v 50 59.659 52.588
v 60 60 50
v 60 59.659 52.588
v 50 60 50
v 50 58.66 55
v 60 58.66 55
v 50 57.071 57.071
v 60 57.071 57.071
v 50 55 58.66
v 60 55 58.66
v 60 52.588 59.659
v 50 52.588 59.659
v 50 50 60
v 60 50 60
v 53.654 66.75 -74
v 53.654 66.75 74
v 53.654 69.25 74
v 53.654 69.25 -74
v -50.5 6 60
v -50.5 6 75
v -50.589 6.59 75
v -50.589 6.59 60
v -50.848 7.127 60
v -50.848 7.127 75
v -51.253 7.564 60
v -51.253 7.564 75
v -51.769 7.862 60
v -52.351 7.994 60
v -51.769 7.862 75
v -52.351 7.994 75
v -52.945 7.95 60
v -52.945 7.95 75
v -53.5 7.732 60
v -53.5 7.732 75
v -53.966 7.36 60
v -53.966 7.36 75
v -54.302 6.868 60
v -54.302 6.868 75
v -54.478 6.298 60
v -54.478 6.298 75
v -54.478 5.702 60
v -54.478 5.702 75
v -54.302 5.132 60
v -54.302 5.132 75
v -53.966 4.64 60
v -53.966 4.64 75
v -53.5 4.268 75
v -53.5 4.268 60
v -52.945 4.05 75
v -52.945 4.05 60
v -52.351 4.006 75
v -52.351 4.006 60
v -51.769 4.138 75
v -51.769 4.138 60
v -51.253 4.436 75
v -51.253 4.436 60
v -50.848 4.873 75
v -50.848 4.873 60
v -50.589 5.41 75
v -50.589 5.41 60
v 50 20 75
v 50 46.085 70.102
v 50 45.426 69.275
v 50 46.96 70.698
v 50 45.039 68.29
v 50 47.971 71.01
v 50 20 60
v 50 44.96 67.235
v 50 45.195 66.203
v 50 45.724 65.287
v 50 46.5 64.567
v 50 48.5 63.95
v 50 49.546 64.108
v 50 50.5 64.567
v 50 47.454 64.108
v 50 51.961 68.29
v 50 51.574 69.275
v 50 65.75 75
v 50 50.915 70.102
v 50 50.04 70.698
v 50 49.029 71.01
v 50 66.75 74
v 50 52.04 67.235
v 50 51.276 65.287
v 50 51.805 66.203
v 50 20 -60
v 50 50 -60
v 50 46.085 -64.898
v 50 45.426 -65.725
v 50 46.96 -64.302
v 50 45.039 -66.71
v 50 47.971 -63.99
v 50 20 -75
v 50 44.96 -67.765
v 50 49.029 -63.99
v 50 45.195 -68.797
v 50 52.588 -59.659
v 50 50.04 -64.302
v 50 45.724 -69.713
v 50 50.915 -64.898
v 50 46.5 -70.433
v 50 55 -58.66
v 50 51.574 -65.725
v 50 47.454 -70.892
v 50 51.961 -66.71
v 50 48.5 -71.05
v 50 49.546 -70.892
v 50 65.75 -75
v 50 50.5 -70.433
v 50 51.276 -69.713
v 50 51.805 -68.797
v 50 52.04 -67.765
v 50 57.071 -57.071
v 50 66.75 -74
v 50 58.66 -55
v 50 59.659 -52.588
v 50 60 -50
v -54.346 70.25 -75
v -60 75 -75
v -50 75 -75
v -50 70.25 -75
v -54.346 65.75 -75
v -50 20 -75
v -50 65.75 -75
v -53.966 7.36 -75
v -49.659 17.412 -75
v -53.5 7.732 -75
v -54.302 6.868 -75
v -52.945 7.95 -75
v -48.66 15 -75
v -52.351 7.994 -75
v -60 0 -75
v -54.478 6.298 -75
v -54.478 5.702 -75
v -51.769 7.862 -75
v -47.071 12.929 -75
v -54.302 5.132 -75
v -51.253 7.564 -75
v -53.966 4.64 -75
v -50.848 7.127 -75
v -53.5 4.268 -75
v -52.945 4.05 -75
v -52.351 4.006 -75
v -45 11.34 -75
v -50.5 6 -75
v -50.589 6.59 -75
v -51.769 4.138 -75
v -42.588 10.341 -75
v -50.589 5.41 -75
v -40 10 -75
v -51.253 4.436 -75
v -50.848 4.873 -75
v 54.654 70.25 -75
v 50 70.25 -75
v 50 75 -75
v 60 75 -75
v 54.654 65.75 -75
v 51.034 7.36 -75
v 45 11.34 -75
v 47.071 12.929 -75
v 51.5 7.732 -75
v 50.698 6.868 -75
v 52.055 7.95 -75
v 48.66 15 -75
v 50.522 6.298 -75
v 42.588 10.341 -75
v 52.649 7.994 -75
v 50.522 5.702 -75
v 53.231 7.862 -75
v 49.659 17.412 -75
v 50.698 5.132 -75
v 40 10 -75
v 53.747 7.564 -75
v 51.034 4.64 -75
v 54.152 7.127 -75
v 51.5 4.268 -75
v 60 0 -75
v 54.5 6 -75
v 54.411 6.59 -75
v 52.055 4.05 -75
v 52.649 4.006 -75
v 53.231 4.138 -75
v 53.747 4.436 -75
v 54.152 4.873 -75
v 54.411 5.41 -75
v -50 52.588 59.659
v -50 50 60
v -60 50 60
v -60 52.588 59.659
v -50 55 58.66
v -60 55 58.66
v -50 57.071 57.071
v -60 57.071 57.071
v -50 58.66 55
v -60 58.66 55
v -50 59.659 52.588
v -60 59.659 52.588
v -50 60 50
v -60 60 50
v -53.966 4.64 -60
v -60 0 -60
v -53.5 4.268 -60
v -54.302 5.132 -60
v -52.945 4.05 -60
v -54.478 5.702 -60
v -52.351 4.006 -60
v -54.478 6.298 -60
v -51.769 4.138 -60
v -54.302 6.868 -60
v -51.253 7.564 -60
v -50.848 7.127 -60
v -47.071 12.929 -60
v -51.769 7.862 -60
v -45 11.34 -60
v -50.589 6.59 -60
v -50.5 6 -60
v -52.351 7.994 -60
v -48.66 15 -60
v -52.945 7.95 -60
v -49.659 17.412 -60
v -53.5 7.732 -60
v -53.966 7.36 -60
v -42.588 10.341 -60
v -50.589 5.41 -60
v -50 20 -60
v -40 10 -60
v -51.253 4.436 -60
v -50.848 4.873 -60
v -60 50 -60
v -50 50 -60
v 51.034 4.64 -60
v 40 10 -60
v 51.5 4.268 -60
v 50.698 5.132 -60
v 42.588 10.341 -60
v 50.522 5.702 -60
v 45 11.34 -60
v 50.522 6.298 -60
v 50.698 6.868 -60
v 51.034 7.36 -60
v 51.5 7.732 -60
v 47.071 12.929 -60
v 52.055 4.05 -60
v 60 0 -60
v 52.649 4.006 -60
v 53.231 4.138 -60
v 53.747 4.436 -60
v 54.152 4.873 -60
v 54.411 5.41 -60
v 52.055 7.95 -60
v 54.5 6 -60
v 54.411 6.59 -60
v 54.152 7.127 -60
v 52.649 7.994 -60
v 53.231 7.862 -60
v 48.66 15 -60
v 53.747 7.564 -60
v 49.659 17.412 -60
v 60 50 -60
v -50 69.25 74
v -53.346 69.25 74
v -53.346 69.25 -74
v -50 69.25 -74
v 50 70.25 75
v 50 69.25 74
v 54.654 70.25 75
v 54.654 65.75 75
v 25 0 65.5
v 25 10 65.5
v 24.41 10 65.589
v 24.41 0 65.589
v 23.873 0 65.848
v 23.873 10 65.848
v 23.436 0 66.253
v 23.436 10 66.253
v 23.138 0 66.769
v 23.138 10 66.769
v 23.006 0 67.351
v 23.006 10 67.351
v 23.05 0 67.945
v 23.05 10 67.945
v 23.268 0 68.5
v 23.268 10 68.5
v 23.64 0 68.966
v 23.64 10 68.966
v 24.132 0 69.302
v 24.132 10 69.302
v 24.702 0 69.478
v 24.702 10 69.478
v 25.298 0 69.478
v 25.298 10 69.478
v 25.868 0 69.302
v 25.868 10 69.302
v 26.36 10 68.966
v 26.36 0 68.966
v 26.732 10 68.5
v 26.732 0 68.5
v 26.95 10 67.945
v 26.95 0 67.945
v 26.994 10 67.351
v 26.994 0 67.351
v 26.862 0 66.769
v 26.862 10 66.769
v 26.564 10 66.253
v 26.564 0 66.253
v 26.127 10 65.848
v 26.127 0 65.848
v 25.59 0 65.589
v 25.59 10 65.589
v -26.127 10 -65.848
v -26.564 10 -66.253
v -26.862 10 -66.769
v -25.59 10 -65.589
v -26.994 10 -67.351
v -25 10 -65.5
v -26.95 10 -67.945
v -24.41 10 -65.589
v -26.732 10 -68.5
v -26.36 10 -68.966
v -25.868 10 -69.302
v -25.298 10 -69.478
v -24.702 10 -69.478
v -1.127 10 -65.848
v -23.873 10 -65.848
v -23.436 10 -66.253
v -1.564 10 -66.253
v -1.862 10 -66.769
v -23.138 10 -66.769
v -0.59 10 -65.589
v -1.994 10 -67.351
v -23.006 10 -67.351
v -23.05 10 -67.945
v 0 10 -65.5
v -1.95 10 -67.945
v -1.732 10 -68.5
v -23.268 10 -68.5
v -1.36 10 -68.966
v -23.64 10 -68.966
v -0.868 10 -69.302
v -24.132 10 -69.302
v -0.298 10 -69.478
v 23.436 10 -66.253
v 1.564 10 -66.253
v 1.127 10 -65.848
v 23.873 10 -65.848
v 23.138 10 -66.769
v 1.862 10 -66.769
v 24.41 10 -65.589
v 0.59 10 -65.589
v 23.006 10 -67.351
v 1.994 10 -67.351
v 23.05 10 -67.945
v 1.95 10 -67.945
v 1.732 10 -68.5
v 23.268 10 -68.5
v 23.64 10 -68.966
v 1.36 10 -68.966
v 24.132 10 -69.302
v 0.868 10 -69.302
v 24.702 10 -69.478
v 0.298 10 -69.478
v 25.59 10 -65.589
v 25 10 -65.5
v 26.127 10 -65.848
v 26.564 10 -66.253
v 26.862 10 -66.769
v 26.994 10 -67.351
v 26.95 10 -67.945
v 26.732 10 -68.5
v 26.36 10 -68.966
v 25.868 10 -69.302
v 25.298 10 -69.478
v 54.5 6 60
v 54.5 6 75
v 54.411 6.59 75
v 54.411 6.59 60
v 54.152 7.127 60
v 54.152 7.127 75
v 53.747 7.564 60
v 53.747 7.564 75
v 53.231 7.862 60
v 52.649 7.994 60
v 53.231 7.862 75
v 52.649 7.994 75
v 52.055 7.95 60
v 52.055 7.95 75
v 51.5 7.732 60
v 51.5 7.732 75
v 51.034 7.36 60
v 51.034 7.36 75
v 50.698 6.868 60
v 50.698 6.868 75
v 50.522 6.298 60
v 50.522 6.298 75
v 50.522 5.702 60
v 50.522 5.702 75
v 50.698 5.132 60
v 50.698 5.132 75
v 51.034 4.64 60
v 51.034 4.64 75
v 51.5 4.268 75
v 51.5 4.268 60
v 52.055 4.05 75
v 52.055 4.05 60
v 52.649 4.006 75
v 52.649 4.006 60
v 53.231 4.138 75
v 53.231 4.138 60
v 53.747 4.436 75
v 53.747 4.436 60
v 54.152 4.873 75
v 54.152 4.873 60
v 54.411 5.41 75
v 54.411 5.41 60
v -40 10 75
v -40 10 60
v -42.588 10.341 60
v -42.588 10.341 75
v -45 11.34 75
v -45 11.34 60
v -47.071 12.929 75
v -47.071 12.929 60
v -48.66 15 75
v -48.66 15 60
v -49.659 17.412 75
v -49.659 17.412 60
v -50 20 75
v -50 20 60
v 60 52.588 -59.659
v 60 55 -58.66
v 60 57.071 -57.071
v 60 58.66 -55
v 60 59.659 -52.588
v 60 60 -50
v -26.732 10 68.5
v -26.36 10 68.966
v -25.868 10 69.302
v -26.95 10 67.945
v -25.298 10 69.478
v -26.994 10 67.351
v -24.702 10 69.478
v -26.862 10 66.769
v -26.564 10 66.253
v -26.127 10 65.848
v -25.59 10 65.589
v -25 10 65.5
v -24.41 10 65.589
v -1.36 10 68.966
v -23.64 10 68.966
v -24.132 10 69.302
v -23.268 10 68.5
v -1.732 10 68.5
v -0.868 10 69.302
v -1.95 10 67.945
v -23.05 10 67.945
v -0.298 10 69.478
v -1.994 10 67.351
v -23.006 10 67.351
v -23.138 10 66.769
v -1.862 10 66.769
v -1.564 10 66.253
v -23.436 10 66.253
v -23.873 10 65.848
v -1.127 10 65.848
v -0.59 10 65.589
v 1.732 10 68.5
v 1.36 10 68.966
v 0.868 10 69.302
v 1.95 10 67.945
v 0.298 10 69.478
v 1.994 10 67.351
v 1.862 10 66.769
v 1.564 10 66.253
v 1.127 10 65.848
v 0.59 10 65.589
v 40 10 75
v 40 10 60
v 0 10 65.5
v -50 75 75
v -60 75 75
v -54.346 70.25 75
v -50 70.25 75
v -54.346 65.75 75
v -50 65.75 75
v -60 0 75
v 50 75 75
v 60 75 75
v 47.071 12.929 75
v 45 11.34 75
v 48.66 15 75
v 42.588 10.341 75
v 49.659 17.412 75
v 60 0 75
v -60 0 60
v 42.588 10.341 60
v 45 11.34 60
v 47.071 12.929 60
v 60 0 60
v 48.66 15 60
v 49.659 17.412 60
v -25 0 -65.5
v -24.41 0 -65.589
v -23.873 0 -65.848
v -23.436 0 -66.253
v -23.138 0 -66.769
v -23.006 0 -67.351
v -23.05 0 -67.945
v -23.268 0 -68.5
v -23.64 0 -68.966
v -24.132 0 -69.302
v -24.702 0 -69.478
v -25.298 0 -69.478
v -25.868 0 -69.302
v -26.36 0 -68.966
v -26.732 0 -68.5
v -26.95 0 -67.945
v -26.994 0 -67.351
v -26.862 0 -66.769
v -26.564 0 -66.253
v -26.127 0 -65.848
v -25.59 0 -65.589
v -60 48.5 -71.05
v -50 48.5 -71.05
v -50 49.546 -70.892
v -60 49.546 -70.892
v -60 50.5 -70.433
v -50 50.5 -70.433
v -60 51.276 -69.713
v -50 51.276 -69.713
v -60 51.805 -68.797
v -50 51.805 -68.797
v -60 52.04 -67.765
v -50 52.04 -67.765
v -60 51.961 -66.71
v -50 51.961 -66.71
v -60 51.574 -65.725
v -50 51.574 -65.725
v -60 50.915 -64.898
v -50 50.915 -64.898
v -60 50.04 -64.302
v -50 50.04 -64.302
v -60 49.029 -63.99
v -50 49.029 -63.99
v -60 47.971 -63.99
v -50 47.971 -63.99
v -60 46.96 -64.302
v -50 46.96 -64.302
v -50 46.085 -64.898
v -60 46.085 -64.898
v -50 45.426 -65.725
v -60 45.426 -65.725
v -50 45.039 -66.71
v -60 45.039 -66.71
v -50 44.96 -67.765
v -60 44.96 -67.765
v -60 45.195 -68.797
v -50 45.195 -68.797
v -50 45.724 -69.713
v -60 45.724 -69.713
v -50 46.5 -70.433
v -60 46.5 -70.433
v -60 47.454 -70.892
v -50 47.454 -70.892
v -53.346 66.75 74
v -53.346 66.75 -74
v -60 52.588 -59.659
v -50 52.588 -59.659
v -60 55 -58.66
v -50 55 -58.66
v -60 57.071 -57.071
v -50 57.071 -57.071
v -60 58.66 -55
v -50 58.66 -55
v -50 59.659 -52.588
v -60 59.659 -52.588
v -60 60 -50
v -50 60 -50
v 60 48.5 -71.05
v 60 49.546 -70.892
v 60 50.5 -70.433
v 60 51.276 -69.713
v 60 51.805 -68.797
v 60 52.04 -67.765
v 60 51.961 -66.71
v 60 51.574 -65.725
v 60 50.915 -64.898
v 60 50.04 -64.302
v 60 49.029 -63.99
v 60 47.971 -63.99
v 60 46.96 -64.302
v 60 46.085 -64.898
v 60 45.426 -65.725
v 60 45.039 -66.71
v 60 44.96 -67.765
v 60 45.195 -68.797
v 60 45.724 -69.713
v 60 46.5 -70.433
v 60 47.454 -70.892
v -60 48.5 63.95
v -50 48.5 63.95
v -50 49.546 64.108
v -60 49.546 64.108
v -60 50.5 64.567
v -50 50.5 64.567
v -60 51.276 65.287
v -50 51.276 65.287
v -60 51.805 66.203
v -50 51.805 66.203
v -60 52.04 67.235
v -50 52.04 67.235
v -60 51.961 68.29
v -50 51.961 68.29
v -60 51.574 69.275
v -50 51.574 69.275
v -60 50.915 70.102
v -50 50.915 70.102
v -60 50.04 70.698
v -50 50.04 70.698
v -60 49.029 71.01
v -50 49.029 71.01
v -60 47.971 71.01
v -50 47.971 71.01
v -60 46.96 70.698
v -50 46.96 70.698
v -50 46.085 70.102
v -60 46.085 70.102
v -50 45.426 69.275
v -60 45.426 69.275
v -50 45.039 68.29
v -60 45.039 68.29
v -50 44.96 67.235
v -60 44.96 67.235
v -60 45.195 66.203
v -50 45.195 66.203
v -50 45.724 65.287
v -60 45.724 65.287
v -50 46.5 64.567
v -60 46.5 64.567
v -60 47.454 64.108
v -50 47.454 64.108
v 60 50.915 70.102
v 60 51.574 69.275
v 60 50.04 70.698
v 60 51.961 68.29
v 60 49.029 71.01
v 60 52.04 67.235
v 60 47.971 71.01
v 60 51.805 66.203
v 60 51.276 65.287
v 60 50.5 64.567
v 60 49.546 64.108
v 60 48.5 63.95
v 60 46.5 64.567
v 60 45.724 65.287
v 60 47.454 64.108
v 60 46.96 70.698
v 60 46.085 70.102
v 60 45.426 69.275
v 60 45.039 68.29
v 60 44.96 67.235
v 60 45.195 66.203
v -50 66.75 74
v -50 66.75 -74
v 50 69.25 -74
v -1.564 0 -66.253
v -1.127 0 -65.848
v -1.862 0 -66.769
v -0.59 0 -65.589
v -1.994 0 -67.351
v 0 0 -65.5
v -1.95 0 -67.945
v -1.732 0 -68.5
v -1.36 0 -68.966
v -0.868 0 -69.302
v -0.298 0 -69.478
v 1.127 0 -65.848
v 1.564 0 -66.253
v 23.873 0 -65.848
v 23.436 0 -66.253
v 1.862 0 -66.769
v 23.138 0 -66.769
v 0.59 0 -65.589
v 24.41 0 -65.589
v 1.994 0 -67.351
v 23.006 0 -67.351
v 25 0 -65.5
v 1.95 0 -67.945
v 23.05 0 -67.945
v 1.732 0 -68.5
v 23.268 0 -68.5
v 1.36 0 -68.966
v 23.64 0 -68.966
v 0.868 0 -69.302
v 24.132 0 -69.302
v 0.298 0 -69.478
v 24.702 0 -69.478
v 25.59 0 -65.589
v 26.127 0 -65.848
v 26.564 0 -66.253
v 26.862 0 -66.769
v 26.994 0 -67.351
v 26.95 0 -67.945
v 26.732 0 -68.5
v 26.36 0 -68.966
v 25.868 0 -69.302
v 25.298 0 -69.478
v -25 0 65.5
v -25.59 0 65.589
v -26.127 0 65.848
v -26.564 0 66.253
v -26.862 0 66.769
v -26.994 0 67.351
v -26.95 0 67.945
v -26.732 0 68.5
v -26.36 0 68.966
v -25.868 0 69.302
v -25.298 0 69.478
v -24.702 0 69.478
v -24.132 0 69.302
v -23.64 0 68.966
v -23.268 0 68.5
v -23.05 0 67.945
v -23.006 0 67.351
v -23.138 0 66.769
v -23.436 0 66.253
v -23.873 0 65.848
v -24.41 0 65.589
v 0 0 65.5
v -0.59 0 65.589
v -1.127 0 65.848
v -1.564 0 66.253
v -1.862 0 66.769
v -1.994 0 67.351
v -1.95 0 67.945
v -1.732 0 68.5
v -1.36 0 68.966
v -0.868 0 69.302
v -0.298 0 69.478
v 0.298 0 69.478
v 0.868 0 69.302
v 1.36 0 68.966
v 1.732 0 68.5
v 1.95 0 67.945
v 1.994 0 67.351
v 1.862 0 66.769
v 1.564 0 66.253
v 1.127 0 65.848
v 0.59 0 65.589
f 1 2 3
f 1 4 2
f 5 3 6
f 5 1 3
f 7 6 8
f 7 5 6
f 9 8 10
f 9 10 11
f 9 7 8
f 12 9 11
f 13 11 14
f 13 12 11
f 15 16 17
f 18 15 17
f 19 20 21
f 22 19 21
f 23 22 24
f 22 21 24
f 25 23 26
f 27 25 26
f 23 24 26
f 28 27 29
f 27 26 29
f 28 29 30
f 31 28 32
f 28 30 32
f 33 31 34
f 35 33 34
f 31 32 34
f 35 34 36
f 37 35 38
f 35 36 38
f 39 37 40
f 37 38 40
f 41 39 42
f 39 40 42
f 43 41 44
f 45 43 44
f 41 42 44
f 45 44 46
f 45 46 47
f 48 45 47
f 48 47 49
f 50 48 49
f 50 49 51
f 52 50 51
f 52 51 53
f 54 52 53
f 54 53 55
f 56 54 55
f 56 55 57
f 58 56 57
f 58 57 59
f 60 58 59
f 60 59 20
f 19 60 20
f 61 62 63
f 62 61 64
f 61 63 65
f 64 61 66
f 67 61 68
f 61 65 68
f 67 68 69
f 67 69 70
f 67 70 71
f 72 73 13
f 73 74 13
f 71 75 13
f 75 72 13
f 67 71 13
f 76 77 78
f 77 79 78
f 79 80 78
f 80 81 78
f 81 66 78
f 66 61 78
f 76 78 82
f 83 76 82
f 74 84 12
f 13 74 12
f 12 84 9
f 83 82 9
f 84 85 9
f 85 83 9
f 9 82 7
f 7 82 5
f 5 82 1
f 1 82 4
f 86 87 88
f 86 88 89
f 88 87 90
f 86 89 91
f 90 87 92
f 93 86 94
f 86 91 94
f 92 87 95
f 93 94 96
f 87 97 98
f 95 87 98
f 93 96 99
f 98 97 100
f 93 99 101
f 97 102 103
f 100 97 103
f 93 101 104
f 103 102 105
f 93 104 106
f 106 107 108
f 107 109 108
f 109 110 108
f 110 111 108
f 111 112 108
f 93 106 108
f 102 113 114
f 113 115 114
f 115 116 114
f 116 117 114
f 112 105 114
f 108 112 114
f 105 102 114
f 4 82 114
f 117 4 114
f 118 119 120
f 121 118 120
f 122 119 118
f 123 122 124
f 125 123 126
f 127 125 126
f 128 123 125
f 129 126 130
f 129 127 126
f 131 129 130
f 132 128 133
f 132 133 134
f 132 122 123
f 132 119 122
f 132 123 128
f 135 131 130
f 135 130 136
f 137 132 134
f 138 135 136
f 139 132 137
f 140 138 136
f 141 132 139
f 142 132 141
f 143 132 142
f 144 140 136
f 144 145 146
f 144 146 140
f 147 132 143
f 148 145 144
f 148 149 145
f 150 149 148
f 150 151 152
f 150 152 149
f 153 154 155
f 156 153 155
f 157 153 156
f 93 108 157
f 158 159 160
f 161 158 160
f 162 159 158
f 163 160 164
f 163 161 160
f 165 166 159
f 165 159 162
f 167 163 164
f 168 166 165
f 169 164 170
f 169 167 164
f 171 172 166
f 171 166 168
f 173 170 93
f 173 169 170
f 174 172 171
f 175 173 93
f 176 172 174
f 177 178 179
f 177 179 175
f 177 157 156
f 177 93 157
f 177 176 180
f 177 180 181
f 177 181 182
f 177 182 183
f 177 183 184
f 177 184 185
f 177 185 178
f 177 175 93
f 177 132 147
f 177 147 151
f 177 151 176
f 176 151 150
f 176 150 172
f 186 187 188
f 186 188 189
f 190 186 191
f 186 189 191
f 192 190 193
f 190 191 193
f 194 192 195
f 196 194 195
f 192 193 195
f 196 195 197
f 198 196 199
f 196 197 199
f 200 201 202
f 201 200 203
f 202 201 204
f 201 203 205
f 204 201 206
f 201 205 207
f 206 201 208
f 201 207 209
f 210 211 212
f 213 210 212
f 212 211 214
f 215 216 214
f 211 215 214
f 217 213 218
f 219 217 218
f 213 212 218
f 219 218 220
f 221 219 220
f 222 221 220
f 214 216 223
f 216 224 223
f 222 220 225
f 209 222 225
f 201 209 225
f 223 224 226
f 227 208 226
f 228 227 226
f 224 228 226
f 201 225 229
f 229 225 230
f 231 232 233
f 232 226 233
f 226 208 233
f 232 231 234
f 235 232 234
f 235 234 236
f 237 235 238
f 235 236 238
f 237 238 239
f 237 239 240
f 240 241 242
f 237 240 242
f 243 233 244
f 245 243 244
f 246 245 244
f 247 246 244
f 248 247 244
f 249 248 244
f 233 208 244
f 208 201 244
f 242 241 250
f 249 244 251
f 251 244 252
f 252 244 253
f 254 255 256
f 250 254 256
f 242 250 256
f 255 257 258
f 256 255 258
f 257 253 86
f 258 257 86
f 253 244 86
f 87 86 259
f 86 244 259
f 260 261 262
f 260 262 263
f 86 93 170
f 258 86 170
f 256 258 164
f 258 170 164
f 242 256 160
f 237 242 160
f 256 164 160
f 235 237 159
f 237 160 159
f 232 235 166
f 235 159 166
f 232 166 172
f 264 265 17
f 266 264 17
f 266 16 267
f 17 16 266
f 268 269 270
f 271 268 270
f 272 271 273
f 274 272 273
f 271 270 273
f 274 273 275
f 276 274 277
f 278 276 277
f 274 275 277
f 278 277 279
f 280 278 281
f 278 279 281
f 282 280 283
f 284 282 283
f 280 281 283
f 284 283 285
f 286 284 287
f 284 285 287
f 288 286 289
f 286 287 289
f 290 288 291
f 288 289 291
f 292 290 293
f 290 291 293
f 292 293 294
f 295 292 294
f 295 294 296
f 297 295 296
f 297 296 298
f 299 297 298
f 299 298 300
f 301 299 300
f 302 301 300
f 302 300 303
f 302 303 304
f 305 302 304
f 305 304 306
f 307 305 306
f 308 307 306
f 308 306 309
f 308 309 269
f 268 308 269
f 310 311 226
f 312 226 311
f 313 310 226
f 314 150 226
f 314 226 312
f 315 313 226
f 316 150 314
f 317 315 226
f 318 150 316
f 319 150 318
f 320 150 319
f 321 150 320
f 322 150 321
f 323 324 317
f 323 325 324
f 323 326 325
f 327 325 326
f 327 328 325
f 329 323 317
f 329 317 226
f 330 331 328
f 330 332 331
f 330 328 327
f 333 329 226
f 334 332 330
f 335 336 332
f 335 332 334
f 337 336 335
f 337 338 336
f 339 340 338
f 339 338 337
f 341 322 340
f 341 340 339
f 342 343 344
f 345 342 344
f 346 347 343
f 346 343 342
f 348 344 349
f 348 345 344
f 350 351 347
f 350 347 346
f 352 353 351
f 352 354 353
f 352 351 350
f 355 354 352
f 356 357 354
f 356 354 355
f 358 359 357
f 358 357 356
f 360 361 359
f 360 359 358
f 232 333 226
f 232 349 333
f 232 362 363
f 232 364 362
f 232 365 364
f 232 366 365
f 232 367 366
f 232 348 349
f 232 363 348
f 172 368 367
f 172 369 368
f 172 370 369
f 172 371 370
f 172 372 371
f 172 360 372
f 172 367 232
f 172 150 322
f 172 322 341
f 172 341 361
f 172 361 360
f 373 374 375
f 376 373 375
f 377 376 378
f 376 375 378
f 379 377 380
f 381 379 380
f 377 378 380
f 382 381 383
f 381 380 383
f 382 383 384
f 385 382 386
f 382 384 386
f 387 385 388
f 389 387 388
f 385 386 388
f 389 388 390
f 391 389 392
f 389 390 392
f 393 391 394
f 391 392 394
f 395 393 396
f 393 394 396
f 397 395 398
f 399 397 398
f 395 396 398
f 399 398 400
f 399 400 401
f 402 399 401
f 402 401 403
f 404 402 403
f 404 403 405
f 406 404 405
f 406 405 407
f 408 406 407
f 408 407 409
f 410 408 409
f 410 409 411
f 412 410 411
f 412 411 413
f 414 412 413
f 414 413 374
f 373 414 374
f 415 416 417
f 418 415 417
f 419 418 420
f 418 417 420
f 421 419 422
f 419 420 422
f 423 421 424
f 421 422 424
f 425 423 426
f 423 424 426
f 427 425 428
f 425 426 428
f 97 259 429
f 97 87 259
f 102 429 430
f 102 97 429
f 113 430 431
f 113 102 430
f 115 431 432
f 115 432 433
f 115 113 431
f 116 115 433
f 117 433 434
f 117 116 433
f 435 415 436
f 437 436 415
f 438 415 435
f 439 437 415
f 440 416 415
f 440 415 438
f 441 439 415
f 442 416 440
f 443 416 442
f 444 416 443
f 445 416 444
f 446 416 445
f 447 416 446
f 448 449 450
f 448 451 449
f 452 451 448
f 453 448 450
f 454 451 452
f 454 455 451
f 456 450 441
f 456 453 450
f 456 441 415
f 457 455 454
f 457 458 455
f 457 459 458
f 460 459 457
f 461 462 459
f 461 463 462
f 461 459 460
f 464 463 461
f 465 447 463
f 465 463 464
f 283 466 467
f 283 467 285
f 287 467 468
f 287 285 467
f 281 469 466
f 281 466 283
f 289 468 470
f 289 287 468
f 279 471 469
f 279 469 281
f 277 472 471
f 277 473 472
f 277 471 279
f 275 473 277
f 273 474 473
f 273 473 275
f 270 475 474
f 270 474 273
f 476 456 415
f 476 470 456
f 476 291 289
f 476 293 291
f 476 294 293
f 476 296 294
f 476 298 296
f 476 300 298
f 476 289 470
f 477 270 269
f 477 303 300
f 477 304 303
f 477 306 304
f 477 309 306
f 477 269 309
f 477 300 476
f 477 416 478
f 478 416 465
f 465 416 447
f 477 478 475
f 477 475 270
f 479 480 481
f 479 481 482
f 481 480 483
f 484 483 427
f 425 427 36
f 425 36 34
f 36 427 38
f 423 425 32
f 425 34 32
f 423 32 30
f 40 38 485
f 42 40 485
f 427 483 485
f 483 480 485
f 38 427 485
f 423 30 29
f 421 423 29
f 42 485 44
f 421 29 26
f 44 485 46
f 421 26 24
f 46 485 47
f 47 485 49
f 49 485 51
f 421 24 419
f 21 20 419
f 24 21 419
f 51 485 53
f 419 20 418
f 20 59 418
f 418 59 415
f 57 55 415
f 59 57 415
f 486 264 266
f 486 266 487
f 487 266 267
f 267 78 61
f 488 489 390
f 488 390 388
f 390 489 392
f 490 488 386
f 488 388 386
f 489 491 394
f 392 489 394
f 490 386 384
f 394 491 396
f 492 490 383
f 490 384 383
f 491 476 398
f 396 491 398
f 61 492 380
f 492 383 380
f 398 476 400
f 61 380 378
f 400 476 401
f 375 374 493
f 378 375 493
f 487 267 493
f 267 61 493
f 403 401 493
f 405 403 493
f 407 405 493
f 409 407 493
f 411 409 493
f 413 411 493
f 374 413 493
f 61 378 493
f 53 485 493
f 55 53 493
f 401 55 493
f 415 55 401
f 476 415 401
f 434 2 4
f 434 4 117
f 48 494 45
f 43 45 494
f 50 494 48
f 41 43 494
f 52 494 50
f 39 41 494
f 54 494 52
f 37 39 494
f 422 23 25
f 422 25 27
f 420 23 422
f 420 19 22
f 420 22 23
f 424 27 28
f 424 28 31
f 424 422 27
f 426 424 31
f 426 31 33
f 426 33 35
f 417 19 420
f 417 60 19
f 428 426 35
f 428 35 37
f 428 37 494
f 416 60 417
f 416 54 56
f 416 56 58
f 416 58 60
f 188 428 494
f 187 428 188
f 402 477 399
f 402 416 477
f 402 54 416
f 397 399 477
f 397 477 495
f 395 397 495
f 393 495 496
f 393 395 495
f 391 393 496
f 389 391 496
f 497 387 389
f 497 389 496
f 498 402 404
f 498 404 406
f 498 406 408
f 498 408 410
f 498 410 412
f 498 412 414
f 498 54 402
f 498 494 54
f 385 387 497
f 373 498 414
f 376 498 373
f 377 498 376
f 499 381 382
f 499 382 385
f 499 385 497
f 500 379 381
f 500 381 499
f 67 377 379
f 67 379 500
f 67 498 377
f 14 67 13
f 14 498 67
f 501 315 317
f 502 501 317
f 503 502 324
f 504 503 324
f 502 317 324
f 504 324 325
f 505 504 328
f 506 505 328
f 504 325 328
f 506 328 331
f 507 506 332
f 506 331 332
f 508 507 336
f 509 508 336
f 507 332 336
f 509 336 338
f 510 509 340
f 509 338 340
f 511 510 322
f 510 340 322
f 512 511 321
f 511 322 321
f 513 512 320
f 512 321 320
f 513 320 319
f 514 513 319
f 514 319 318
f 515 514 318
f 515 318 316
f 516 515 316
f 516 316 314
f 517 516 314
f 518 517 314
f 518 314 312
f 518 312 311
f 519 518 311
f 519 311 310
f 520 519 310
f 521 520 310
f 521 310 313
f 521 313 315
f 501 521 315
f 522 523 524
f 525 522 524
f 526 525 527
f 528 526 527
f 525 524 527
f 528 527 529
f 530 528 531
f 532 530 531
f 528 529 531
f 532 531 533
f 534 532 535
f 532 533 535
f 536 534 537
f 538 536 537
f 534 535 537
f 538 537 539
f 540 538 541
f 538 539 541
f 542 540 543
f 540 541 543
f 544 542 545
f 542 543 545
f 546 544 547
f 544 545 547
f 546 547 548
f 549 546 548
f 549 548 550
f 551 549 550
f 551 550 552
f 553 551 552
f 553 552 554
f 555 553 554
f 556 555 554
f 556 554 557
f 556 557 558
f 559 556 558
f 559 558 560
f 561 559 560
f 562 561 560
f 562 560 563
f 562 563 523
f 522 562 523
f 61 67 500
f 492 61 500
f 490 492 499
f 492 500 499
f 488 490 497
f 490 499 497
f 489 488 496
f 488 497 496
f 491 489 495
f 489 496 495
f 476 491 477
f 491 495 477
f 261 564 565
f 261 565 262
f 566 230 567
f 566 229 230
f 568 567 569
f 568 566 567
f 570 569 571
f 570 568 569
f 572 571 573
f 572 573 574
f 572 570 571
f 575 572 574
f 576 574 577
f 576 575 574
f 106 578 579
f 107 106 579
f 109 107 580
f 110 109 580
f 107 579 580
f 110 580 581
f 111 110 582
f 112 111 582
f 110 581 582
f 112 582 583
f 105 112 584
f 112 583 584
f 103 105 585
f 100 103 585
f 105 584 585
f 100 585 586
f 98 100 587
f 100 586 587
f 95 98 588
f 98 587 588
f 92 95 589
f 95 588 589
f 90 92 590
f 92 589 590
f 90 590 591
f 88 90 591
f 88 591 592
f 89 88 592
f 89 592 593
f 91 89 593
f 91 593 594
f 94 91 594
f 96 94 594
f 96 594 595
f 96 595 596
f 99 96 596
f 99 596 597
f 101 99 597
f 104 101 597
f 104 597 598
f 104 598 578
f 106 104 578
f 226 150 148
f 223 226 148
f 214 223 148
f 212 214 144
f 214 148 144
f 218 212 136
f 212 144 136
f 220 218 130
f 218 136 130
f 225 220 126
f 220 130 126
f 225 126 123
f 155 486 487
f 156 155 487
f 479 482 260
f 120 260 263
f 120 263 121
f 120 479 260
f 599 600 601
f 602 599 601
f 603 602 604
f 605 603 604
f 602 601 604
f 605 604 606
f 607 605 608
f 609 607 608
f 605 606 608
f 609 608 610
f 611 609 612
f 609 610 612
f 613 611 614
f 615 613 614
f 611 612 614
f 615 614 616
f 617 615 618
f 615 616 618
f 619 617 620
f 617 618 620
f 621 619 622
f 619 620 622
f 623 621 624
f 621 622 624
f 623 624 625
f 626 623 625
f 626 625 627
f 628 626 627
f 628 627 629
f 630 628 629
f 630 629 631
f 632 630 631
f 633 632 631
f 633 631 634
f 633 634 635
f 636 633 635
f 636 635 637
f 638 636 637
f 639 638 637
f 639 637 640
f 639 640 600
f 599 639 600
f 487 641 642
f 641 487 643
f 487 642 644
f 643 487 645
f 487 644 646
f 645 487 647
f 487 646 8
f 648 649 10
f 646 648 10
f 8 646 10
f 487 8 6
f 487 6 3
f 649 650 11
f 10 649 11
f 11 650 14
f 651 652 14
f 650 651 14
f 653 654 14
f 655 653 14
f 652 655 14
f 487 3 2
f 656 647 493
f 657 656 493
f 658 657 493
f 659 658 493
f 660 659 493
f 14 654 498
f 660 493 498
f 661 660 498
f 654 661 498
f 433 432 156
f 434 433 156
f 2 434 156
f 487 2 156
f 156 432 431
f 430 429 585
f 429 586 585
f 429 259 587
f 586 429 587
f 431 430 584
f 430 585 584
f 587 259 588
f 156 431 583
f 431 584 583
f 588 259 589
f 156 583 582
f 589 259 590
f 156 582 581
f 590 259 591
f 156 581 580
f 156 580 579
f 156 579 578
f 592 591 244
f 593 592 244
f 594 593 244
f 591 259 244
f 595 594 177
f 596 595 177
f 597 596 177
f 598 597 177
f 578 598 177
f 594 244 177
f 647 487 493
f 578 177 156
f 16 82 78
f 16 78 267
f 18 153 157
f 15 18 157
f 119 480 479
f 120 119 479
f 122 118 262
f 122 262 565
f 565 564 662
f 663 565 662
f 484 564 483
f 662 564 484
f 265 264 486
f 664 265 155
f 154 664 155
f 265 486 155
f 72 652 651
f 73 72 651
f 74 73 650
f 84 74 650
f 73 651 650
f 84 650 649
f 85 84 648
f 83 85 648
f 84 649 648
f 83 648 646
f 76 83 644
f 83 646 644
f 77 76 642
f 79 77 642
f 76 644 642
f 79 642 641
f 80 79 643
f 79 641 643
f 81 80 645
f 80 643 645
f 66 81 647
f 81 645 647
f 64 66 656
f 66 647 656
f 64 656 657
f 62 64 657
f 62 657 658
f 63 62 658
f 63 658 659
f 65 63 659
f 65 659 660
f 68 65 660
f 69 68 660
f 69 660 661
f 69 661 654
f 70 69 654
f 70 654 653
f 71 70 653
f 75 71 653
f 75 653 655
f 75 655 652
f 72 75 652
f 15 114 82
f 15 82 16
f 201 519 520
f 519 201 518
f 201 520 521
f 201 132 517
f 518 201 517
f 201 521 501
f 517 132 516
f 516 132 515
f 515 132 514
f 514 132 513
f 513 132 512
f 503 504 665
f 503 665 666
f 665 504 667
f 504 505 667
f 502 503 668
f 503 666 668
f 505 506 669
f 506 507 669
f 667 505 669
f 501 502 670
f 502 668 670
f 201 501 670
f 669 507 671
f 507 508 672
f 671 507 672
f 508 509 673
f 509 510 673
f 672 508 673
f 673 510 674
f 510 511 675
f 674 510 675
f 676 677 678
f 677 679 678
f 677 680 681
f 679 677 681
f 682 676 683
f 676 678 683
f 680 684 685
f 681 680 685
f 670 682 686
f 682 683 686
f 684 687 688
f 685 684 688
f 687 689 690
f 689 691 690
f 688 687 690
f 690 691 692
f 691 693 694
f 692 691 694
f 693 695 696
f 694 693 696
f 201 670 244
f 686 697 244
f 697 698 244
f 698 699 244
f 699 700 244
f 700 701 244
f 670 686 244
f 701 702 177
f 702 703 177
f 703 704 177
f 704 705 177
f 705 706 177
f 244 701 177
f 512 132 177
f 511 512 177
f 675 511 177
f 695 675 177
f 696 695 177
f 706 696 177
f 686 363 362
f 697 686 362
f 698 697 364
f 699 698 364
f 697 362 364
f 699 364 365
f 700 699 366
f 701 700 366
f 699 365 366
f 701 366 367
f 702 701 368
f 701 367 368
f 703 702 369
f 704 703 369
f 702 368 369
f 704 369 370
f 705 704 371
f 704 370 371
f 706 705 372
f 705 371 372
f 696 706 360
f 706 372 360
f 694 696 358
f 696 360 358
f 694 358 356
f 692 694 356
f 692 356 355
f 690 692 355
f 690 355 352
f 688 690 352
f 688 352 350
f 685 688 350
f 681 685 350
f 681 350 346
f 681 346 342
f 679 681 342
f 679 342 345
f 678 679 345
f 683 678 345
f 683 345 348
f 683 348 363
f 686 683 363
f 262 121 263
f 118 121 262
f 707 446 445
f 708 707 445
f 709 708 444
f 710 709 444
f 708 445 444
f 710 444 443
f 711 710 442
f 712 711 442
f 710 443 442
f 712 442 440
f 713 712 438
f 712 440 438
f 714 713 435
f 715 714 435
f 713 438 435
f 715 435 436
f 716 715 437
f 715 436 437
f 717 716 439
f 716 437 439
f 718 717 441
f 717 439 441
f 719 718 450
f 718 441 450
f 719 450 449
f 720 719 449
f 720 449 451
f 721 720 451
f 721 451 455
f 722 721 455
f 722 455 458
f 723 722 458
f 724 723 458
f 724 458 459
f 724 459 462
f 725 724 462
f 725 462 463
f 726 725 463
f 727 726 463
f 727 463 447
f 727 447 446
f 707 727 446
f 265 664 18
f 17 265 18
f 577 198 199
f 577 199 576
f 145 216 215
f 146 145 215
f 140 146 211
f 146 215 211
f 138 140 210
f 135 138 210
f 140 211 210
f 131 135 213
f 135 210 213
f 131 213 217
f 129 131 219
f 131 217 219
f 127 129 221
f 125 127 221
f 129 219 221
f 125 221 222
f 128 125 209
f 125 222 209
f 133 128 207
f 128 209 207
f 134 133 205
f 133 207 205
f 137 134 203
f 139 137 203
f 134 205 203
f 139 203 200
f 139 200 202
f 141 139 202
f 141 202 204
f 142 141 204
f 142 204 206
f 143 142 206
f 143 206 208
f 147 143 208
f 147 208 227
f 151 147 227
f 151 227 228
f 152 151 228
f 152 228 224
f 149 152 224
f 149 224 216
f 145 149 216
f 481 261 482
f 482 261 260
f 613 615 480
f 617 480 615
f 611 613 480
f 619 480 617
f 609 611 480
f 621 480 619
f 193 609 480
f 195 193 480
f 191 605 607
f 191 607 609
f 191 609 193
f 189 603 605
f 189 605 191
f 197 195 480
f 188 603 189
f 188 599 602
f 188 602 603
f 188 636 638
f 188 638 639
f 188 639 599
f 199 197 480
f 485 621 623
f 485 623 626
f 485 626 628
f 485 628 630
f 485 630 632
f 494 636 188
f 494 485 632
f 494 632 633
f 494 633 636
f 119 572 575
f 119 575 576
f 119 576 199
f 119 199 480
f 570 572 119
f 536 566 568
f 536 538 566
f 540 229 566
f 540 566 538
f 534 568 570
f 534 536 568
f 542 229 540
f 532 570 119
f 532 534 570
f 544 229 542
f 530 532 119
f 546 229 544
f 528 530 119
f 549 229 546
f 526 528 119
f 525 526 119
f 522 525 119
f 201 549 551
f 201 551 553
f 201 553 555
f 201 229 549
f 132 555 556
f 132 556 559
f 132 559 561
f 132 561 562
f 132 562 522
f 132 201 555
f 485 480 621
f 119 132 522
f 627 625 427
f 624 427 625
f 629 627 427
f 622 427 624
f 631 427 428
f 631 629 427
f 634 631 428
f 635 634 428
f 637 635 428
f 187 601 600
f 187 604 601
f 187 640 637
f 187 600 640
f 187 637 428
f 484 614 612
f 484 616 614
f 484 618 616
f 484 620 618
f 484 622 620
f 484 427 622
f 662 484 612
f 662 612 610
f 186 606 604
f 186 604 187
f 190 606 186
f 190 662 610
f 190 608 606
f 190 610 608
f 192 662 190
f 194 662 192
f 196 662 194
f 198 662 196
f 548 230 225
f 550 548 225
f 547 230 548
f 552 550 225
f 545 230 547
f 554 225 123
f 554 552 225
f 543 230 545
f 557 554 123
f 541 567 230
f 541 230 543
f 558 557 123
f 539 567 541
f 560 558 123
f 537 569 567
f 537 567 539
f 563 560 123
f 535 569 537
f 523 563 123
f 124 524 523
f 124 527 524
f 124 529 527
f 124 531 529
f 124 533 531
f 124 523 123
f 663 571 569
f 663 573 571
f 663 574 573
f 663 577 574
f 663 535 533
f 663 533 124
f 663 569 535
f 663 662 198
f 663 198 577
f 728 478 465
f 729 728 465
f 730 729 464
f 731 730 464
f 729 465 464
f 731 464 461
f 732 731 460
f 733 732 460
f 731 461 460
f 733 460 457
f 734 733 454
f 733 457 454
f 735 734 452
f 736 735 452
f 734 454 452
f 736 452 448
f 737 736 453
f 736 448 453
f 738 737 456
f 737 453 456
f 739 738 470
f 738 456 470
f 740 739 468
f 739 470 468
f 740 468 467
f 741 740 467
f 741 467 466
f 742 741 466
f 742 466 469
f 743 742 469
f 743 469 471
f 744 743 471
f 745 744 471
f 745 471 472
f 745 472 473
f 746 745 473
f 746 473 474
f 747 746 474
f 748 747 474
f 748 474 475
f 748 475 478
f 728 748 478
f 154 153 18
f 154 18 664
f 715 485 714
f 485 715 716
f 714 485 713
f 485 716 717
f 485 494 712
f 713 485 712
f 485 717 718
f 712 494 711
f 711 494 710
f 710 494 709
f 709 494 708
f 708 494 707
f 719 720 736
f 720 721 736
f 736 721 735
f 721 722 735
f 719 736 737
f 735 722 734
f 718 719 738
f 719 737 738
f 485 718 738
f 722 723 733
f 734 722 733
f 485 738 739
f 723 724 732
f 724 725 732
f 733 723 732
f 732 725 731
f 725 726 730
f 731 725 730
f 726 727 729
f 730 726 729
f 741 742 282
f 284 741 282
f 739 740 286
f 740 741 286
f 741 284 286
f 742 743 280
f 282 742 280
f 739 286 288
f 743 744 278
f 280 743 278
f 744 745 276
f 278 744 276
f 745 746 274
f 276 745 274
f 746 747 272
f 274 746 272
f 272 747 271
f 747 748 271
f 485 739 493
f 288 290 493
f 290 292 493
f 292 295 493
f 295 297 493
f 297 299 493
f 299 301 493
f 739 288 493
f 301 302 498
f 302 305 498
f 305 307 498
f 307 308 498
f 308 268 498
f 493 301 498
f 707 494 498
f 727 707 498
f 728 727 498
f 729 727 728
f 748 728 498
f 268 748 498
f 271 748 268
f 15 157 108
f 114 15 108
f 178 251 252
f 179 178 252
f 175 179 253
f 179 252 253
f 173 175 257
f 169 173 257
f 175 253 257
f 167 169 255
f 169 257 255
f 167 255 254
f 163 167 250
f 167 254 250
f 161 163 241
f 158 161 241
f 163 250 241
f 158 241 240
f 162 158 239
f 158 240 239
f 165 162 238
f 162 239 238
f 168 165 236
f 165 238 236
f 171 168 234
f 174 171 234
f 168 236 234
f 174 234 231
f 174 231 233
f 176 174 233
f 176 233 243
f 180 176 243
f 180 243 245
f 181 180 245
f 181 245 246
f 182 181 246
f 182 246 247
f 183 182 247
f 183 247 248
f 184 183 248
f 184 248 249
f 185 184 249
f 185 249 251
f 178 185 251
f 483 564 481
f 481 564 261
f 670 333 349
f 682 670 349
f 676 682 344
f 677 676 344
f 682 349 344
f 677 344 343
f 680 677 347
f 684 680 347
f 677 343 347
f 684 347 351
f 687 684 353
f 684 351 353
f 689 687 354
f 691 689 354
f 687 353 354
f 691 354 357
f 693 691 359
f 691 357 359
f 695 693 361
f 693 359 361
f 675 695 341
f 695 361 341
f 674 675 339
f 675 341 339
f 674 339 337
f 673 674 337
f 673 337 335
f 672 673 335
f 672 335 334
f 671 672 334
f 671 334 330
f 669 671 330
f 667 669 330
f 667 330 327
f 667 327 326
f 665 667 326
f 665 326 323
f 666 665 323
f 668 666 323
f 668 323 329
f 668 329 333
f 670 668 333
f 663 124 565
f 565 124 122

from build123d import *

# Parameters (mm, degrees)
SKETCH1_W           = 120
SKETCH1_H           = 150
BOSS_EXTRUDE1_DEPTH = 75
SKETCH3_W           = 107
SKETCH3_H           = 2.5
CUT_EXTRUDE2_DEPTH  = 179.115131306
SKETCH2_W           = 100
SKETCH2_H           = 150
CUT_EXTRUDE1_DEPTH  = 65
FILLET1_R           = 10
SKETCH4_R           = 2
CUT_EXTRUDE3_DEPTH  = 116.974135047
SKETCH5_R           = 2
CUT_EXTRUDE4_DEPTH  = 179.115131306
SKETCH6_R           = 3.55
CUT_EXTRUDE5_DEPTH  = 161.15617378
CHAMFER1_SIZE       = 1
SKETCH7_W           = 120
SKETCH7_H           = 60
CUT_EXTRUDE6_DEPTH  = 161.15617378
FILLET2_R           = 10


with BuildPart() as part:
    # Sketch1 → Boss-Extrude1 (new body)
    with BuildSketch(Plane(origin=(0, 0, 0), x_dir=(1, 0, 0), z_dir=(0, 1, 0))):
        Rectangle(SKETCH1_W, SKETCH1_H)
    extrude(amount=BOSS_EXTRUDE1_DEPTH)

    # Sketch3 → Cut-Extrude2 (cut, through all)
    with BuildSketch(Plane.XY.offset(75)):
        with Locations((0.15445013, 68)):
            Rectangle(SKETCH3_W, SKETCH3_H)
    extrude(amount=-CUT_EXTRUDE2_DEPTH, mode=Mode.SUBTRACT)

    # Sketch2 → Cut-Extrude1 (cut)
    with BuildSketch(Plane(origin=(0, 75, 0), x_dir=(1, 0, 0), z_dir=(0, 1, 0))):
        Rectangle(SKETCH2_W, SKETCH2_H)
    extrude(amount=-CUT_EXTRUDE1_DEPTH, mode=Mode.SUBTRACT)

    # Fillet1
    fillet1_edges = [part.edges().sort_by_distance(p)[0] for p in [
        (50, 10, 0),
        (-50, 10, 0),
    ]]
    fillet(fillet1_edges, radius=FILLET1_R)

    # Sketch4 → Cut-Extrude3 (cut, through all)
    with BuildSketch(Plane(origin=(0, 10, 0), x_dir=(1, 0, 0), z_dir=(0, 1, 0))):
        with Locations(Location((0, 67.5, 0), (0, 0, 270))):
            Circle(SKETCH4_R)
        with Locations(Location((25, 67.5, 0), (0, 0, 270))):
            Circle(SKETCH4_R)
        with Locations(Location((-25, 67.5, 0), (0, 0, 270))):
            Circle(SKETCH4_R)
        with Locations(Location((-25, -67.5, 0), (0, 0, 90))):
            Circle(SKETCH4_R)
        with Locations(Location((25, -67.5, 0), (0, 0, 90))):
            Circle(SKETCH4_R)
        with Locations(Location((0, -67.5, 0), (0, 0, 90))):
            Circle(SKETCH4_R)
    extrude(amount=-CUT_EXTRUDE3_DEPTH, mode=Mode.SUBTRACT)

    # Sketch5 → Cut-Extrude4 (cut, through all)
    with BuildSketch(Plane.XY.offset(75)):
        with Locations((-52.5, 6)):
            Circle(SKETCH5_R)
        with Locations((52.5, 6)):
            Circle(SKETCH5_R)
    extrude(amount=-CUT_EXTRUDE4_DEPTH, mode=Mode.SUBTRACT)

    # Sketch6 → Cut-Extrude5 (cut, through all)
    with BuildSketch(Plane(origin=(60, 0, 0), x_dir=(0, 0, -1), z_dir=(1, 0, 0))):
        with Locations((67.5, 48.5)):
            Circle(SKETCH6_R)
        with Locations((-67.5, 48.5)):
            Circle(SKETCH6_R)
    extrude(amount=-CUT_EXTRUDE5_DEPTH, mode=Mode.SUBTRACT)

    # Chamfer1
    chamfer1_edges = [part.edges().sort_by_distance(p)[0] for p in [
        (53.65445013, 68, -75),
        (-51.672774935, 66.75, -75),
        (-53.34554987, 68, -75),
        (51.827225065, 69.25, -75),
        (53.65445013, 68, 75),
        (51.827225065, 69.25, 75),
        (-53.34554987, 68, 75),
        (-51.672774935, 66.75, 75),
        (-51.672774935, 69.25, 75),
        (-51.672774935, 69.25, -75),
        (51.827225065, 66.75, 75),
        (51.827225065, 66.75, -75),
    ]]
    chamfer(chamfer1_edges, length=CHAMFER1_SIZE)

    # Sketch7 → Cut-Extrude6 (cut, through all)
    with BuildSketch(Plane(origin=(60, 0, 0), x_dir=(0, 0, -1), z_dir=(1, 0, 0))):
        with Locations((0, 30)):
            Rectangle(SKETCH7_W, SKETCH7_H)
    extrude(amount=-CUT_EXTRUDE6_DEPTH, mode=Mode.SUBTRACT)

    # Fillet2
    fillet2_edges = [part.edges().sort_by_distance(p)[0] for p in [
        (55, 60, 60),
        (-55, 60, 60),
        (-55, 60, -60),
        (55, 60, -60),
    ]]
    fillet(fillet2_edges, radius=FILLET2_R)


solid = part.part
